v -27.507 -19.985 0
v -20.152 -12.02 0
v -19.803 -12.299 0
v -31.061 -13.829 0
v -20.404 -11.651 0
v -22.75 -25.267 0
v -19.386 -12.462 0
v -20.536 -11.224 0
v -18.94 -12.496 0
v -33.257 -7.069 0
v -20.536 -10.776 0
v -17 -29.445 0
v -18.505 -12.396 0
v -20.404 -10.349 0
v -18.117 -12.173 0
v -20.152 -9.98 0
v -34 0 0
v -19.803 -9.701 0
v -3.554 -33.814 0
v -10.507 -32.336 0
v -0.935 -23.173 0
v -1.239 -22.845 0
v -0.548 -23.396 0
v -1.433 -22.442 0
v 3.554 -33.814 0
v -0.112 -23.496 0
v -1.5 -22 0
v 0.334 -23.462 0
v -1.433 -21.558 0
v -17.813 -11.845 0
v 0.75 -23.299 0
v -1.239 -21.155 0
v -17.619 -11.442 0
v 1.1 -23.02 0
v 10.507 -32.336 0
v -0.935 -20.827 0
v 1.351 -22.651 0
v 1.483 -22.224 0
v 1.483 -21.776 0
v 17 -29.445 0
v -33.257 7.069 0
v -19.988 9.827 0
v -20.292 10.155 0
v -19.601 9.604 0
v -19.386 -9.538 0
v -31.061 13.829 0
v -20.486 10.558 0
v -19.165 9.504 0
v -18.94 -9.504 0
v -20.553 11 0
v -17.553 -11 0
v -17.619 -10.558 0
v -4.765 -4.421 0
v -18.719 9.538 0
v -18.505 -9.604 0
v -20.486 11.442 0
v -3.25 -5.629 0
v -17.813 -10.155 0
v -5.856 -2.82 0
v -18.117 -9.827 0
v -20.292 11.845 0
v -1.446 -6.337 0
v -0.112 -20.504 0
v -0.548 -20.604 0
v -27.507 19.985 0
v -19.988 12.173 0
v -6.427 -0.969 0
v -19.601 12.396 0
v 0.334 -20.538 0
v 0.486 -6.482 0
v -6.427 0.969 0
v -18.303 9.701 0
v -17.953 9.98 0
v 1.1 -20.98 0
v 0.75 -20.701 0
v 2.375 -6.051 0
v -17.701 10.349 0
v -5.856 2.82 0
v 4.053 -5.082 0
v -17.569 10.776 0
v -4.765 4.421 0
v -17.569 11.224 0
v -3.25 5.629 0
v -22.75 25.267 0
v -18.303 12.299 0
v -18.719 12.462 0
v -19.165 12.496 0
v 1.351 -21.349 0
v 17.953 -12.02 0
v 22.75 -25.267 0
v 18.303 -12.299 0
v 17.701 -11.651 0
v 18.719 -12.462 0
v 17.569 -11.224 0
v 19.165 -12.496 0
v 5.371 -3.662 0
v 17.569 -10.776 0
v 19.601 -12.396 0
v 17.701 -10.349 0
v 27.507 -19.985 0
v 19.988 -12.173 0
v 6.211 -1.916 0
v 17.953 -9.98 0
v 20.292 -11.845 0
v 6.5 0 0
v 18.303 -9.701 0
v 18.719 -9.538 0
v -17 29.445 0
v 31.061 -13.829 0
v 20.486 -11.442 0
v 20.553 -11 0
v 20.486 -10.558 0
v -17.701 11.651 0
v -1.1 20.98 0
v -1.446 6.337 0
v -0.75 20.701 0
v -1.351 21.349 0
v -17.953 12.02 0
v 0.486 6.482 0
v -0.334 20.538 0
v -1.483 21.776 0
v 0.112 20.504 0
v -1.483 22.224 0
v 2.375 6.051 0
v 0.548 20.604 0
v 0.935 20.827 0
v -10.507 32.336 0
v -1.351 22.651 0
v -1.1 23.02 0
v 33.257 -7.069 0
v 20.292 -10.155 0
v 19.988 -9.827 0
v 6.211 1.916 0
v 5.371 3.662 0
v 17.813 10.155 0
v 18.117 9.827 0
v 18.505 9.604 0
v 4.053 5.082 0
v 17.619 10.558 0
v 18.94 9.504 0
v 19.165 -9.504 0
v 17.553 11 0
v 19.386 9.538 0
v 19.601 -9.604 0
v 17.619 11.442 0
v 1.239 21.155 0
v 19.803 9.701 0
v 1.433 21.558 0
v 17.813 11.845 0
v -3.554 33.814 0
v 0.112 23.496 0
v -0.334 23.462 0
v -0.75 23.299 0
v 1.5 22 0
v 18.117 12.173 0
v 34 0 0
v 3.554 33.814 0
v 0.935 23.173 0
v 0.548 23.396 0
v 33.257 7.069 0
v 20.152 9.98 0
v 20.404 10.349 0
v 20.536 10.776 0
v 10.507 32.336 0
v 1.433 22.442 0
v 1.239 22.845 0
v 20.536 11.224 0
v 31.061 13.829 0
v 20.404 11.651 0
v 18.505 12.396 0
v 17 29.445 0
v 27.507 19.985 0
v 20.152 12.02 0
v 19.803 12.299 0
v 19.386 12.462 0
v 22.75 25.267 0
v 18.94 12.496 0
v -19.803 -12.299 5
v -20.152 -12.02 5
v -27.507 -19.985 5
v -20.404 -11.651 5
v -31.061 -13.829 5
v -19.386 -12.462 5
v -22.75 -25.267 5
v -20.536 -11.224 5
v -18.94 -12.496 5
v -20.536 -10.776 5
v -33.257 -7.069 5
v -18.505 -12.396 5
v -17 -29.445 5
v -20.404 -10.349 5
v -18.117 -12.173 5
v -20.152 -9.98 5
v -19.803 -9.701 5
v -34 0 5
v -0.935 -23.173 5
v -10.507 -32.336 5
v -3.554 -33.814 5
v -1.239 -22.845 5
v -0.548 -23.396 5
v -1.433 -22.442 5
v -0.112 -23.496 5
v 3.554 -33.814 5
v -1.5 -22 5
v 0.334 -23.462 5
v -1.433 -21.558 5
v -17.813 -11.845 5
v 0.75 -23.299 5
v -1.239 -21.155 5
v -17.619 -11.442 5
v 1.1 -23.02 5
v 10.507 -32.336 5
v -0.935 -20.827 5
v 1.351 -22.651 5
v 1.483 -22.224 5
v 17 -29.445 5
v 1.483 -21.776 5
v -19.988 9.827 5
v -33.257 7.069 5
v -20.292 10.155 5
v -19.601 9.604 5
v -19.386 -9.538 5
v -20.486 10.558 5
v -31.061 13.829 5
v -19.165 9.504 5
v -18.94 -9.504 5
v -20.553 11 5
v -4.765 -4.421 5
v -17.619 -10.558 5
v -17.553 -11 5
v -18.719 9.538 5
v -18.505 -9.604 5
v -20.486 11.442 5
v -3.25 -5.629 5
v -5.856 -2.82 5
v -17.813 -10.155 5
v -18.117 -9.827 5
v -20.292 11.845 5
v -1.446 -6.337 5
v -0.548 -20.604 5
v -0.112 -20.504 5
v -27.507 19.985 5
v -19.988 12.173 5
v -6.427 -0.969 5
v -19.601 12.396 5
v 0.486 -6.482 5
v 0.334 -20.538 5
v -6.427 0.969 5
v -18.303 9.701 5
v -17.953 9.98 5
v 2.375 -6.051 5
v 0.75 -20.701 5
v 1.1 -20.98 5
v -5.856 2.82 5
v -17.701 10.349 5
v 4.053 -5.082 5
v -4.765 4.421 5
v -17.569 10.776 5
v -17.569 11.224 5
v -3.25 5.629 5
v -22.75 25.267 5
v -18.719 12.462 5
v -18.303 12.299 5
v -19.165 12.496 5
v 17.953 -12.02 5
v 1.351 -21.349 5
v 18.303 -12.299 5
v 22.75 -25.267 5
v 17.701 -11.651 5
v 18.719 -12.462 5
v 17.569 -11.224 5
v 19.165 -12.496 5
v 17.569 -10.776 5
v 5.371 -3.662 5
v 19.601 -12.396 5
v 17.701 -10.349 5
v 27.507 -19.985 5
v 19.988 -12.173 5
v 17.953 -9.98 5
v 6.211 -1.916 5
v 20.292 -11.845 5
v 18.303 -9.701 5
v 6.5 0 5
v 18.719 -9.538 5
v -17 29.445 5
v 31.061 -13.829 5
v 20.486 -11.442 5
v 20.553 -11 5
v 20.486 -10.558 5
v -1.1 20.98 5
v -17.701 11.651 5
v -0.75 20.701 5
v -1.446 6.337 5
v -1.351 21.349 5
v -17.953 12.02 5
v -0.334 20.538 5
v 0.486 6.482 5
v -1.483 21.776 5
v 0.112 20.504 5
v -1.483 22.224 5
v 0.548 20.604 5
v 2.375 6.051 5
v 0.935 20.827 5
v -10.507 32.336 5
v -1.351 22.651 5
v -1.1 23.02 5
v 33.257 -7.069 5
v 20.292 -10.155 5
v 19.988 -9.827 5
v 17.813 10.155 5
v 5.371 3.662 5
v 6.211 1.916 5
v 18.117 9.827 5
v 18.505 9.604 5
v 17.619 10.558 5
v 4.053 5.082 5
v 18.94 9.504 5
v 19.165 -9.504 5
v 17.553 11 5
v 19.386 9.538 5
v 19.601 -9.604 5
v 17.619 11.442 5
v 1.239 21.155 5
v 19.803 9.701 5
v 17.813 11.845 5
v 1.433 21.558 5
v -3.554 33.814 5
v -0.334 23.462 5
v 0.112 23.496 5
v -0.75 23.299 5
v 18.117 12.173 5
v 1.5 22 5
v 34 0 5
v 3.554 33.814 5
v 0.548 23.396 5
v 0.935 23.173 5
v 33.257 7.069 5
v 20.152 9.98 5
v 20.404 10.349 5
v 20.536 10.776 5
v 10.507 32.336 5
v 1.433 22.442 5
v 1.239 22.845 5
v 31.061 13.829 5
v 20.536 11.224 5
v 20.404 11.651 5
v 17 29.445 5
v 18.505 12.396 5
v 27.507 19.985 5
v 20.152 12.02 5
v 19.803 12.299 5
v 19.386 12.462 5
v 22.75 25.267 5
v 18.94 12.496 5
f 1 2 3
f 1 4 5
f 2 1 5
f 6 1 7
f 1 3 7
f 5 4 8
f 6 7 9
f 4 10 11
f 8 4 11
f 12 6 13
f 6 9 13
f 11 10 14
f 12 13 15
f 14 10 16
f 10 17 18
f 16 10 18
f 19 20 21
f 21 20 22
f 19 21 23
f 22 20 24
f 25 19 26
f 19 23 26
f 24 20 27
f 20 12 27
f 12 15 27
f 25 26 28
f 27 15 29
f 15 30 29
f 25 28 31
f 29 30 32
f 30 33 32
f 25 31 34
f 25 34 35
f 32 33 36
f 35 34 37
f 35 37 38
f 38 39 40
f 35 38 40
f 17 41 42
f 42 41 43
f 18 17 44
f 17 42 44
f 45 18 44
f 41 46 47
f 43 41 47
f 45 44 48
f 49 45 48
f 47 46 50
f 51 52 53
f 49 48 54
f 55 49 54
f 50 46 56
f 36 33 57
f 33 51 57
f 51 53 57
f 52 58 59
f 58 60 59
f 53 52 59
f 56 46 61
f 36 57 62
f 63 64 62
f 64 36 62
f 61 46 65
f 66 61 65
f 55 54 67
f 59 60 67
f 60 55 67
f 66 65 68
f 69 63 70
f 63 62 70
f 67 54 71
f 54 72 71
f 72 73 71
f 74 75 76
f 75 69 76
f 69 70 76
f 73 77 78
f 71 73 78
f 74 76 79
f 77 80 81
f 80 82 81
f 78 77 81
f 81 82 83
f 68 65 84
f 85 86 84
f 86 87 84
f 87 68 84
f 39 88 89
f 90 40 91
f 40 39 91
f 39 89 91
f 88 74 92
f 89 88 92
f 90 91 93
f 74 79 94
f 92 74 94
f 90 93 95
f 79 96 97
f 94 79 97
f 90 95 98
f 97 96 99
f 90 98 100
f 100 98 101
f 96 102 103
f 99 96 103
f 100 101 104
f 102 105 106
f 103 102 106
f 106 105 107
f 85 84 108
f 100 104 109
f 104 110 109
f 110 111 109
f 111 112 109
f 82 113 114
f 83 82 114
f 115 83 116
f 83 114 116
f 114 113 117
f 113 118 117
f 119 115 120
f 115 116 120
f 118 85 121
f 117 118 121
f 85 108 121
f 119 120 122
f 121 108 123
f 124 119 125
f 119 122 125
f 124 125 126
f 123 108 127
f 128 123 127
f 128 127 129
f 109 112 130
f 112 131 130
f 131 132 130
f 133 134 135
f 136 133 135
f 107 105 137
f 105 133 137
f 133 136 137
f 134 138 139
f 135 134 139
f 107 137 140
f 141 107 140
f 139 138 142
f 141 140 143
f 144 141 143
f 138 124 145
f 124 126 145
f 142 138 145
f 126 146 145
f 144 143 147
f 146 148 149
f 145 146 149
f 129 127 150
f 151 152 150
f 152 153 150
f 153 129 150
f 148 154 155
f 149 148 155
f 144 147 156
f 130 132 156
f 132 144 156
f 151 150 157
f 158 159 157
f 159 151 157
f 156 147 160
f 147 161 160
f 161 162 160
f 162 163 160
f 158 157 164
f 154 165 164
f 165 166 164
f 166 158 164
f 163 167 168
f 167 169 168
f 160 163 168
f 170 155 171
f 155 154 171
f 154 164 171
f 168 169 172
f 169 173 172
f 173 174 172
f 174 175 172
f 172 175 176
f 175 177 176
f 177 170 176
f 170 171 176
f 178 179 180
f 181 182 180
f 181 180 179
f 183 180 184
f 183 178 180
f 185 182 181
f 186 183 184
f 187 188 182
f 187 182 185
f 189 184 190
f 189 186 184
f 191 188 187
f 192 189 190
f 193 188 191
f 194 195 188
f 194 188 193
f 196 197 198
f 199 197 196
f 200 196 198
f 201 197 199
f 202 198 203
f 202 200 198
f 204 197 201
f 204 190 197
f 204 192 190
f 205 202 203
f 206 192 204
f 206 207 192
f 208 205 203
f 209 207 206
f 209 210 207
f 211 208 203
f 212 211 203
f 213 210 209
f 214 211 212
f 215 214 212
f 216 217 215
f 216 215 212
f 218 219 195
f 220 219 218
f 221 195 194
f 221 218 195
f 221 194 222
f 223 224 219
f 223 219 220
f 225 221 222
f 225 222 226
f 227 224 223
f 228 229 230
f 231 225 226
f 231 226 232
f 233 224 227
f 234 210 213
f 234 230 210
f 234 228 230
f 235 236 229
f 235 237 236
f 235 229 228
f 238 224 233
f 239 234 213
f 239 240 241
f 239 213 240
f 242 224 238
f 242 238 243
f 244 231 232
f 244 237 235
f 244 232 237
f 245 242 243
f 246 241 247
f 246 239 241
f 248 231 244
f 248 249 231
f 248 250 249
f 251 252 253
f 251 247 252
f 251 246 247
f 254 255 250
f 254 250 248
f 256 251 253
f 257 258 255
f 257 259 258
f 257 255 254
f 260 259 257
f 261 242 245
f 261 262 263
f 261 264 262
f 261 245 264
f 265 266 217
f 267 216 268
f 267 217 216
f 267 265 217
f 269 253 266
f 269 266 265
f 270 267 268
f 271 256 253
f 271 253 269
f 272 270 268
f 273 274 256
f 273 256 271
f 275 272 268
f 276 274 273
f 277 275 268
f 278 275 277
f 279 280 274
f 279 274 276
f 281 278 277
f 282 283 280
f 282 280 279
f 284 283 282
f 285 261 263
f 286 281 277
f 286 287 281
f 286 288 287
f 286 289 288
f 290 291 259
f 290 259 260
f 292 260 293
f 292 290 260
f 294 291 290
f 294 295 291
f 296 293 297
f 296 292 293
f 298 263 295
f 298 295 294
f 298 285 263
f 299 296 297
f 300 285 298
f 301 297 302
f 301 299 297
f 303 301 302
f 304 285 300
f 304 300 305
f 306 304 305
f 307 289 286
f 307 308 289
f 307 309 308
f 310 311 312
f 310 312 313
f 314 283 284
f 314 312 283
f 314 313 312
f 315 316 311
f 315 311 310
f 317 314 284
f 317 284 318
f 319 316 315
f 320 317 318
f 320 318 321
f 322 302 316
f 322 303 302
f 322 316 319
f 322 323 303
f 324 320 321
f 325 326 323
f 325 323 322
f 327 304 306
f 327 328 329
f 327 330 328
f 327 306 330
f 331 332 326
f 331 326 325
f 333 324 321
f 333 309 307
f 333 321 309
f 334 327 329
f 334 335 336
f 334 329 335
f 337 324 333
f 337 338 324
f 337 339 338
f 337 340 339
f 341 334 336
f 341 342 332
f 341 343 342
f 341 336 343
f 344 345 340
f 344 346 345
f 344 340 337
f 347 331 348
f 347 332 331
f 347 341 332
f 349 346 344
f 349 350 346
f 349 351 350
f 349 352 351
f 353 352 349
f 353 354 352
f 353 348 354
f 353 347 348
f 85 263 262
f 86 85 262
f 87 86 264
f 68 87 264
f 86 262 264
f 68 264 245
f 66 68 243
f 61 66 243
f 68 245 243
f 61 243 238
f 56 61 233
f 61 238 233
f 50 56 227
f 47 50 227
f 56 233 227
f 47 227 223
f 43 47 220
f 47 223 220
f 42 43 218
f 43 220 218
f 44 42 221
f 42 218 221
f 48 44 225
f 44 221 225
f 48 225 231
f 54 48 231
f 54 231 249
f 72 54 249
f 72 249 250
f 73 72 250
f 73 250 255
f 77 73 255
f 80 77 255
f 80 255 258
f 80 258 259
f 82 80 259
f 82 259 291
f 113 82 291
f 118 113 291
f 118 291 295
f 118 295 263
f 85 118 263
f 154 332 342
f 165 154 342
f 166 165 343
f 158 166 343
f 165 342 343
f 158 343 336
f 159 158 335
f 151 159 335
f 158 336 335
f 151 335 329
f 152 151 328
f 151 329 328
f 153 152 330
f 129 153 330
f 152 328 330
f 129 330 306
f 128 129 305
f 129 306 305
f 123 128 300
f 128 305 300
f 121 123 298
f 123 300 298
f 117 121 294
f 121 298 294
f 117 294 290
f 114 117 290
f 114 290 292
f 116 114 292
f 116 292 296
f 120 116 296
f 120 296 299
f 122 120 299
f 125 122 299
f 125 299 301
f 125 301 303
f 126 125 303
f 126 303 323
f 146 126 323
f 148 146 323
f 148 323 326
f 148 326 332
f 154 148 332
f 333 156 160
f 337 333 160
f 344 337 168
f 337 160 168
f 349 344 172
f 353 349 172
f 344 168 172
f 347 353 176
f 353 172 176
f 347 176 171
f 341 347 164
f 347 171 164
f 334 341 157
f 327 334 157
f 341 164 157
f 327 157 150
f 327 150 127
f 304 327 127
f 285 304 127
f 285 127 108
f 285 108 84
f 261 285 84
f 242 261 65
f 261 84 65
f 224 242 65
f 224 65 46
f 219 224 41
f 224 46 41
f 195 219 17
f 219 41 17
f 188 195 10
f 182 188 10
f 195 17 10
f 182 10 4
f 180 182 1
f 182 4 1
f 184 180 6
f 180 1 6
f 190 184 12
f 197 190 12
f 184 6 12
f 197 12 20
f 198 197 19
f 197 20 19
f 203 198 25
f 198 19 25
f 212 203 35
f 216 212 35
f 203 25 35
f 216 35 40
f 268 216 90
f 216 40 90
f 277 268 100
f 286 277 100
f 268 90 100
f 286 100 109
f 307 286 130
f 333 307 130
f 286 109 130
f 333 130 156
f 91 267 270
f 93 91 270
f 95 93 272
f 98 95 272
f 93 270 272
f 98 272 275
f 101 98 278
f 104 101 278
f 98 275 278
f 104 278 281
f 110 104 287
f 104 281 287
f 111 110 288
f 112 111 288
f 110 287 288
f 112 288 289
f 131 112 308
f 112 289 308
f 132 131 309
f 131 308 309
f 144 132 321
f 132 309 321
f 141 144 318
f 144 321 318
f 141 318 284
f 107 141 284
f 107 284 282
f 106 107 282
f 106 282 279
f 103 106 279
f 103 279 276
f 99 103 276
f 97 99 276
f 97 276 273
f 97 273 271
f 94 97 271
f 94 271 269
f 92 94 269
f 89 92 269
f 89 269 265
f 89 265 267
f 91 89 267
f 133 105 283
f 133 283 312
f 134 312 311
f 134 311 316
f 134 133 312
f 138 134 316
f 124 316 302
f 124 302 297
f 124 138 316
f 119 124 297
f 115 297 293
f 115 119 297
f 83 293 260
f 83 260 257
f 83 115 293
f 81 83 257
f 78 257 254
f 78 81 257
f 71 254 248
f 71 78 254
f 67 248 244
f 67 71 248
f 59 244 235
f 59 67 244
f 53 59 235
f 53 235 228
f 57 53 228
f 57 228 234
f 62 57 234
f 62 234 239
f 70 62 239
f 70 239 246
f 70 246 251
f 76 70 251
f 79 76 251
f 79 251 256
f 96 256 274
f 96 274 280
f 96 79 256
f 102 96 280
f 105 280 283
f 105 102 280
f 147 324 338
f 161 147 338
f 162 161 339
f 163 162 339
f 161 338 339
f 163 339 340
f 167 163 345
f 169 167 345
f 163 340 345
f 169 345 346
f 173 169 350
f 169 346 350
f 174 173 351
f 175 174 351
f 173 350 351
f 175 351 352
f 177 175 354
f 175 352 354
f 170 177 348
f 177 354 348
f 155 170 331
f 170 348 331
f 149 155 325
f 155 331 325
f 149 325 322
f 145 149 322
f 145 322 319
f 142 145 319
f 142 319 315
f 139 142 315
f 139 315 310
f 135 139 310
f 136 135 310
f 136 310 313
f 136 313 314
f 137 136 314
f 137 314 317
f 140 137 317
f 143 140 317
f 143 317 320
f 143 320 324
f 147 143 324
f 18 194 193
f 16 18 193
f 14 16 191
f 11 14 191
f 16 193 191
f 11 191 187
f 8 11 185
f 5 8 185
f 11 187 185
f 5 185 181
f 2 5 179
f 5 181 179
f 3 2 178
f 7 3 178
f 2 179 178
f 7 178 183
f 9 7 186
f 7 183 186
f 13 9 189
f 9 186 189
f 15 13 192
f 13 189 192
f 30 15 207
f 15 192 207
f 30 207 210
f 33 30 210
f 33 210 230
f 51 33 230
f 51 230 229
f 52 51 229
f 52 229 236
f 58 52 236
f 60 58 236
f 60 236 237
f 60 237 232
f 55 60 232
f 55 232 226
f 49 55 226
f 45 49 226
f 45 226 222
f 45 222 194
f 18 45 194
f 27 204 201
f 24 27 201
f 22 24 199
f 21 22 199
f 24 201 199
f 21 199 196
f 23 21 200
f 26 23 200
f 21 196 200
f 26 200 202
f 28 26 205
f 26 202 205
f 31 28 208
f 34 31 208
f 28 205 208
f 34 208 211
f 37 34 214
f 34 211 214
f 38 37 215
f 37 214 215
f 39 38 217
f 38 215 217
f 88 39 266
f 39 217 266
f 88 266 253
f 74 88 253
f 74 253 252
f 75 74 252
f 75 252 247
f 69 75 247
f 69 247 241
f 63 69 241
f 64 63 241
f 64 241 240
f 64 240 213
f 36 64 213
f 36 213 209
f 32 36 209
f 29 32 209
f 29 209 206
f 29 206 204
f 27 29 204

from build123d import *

# Parameters (mm, degrees)
SKETCH_R           = 34
SKETCH_R_2         = 6.5
PAD_DEPTH          = 5
SKETCH001_R        = 1.5
POCKET_DEPTH       = 10
POLARPATTERN_COUNT = 6


with BuildPart() as part:
    # Sketch → Pad (new body)
    with BuildSketch(Plane.XY):
        Circle(SKETCH_R)
        Circle(SKETCH_R_2, mode=Mode.SUBTRACT)
    extrude(amount=PAD_DEPTH)

    # Sketch001 (on Face4 of Pad) → Pocket (cut)
    with BuildSketch(Plane.XY.offset(5)):
        with Locations((0, 22)):
            Circle(SKETCH001_R)
    pocket = extrude(amount=-POCKET_DEPTH, mode=Mode.SUBTRACT)

    # PolarPattern: Pocket ×6 about axis
    polarpattern_axis = Axis((0, 0, 5), (0, 0, 1))
    for i in range(1, POLARPATTERN_COUNT):
        add(pocket.rotate(polarpattern_axis, i * 360 / POLARPATTERN_COUNT), mode=Mode.SUBTRACT)


solid = part.part
